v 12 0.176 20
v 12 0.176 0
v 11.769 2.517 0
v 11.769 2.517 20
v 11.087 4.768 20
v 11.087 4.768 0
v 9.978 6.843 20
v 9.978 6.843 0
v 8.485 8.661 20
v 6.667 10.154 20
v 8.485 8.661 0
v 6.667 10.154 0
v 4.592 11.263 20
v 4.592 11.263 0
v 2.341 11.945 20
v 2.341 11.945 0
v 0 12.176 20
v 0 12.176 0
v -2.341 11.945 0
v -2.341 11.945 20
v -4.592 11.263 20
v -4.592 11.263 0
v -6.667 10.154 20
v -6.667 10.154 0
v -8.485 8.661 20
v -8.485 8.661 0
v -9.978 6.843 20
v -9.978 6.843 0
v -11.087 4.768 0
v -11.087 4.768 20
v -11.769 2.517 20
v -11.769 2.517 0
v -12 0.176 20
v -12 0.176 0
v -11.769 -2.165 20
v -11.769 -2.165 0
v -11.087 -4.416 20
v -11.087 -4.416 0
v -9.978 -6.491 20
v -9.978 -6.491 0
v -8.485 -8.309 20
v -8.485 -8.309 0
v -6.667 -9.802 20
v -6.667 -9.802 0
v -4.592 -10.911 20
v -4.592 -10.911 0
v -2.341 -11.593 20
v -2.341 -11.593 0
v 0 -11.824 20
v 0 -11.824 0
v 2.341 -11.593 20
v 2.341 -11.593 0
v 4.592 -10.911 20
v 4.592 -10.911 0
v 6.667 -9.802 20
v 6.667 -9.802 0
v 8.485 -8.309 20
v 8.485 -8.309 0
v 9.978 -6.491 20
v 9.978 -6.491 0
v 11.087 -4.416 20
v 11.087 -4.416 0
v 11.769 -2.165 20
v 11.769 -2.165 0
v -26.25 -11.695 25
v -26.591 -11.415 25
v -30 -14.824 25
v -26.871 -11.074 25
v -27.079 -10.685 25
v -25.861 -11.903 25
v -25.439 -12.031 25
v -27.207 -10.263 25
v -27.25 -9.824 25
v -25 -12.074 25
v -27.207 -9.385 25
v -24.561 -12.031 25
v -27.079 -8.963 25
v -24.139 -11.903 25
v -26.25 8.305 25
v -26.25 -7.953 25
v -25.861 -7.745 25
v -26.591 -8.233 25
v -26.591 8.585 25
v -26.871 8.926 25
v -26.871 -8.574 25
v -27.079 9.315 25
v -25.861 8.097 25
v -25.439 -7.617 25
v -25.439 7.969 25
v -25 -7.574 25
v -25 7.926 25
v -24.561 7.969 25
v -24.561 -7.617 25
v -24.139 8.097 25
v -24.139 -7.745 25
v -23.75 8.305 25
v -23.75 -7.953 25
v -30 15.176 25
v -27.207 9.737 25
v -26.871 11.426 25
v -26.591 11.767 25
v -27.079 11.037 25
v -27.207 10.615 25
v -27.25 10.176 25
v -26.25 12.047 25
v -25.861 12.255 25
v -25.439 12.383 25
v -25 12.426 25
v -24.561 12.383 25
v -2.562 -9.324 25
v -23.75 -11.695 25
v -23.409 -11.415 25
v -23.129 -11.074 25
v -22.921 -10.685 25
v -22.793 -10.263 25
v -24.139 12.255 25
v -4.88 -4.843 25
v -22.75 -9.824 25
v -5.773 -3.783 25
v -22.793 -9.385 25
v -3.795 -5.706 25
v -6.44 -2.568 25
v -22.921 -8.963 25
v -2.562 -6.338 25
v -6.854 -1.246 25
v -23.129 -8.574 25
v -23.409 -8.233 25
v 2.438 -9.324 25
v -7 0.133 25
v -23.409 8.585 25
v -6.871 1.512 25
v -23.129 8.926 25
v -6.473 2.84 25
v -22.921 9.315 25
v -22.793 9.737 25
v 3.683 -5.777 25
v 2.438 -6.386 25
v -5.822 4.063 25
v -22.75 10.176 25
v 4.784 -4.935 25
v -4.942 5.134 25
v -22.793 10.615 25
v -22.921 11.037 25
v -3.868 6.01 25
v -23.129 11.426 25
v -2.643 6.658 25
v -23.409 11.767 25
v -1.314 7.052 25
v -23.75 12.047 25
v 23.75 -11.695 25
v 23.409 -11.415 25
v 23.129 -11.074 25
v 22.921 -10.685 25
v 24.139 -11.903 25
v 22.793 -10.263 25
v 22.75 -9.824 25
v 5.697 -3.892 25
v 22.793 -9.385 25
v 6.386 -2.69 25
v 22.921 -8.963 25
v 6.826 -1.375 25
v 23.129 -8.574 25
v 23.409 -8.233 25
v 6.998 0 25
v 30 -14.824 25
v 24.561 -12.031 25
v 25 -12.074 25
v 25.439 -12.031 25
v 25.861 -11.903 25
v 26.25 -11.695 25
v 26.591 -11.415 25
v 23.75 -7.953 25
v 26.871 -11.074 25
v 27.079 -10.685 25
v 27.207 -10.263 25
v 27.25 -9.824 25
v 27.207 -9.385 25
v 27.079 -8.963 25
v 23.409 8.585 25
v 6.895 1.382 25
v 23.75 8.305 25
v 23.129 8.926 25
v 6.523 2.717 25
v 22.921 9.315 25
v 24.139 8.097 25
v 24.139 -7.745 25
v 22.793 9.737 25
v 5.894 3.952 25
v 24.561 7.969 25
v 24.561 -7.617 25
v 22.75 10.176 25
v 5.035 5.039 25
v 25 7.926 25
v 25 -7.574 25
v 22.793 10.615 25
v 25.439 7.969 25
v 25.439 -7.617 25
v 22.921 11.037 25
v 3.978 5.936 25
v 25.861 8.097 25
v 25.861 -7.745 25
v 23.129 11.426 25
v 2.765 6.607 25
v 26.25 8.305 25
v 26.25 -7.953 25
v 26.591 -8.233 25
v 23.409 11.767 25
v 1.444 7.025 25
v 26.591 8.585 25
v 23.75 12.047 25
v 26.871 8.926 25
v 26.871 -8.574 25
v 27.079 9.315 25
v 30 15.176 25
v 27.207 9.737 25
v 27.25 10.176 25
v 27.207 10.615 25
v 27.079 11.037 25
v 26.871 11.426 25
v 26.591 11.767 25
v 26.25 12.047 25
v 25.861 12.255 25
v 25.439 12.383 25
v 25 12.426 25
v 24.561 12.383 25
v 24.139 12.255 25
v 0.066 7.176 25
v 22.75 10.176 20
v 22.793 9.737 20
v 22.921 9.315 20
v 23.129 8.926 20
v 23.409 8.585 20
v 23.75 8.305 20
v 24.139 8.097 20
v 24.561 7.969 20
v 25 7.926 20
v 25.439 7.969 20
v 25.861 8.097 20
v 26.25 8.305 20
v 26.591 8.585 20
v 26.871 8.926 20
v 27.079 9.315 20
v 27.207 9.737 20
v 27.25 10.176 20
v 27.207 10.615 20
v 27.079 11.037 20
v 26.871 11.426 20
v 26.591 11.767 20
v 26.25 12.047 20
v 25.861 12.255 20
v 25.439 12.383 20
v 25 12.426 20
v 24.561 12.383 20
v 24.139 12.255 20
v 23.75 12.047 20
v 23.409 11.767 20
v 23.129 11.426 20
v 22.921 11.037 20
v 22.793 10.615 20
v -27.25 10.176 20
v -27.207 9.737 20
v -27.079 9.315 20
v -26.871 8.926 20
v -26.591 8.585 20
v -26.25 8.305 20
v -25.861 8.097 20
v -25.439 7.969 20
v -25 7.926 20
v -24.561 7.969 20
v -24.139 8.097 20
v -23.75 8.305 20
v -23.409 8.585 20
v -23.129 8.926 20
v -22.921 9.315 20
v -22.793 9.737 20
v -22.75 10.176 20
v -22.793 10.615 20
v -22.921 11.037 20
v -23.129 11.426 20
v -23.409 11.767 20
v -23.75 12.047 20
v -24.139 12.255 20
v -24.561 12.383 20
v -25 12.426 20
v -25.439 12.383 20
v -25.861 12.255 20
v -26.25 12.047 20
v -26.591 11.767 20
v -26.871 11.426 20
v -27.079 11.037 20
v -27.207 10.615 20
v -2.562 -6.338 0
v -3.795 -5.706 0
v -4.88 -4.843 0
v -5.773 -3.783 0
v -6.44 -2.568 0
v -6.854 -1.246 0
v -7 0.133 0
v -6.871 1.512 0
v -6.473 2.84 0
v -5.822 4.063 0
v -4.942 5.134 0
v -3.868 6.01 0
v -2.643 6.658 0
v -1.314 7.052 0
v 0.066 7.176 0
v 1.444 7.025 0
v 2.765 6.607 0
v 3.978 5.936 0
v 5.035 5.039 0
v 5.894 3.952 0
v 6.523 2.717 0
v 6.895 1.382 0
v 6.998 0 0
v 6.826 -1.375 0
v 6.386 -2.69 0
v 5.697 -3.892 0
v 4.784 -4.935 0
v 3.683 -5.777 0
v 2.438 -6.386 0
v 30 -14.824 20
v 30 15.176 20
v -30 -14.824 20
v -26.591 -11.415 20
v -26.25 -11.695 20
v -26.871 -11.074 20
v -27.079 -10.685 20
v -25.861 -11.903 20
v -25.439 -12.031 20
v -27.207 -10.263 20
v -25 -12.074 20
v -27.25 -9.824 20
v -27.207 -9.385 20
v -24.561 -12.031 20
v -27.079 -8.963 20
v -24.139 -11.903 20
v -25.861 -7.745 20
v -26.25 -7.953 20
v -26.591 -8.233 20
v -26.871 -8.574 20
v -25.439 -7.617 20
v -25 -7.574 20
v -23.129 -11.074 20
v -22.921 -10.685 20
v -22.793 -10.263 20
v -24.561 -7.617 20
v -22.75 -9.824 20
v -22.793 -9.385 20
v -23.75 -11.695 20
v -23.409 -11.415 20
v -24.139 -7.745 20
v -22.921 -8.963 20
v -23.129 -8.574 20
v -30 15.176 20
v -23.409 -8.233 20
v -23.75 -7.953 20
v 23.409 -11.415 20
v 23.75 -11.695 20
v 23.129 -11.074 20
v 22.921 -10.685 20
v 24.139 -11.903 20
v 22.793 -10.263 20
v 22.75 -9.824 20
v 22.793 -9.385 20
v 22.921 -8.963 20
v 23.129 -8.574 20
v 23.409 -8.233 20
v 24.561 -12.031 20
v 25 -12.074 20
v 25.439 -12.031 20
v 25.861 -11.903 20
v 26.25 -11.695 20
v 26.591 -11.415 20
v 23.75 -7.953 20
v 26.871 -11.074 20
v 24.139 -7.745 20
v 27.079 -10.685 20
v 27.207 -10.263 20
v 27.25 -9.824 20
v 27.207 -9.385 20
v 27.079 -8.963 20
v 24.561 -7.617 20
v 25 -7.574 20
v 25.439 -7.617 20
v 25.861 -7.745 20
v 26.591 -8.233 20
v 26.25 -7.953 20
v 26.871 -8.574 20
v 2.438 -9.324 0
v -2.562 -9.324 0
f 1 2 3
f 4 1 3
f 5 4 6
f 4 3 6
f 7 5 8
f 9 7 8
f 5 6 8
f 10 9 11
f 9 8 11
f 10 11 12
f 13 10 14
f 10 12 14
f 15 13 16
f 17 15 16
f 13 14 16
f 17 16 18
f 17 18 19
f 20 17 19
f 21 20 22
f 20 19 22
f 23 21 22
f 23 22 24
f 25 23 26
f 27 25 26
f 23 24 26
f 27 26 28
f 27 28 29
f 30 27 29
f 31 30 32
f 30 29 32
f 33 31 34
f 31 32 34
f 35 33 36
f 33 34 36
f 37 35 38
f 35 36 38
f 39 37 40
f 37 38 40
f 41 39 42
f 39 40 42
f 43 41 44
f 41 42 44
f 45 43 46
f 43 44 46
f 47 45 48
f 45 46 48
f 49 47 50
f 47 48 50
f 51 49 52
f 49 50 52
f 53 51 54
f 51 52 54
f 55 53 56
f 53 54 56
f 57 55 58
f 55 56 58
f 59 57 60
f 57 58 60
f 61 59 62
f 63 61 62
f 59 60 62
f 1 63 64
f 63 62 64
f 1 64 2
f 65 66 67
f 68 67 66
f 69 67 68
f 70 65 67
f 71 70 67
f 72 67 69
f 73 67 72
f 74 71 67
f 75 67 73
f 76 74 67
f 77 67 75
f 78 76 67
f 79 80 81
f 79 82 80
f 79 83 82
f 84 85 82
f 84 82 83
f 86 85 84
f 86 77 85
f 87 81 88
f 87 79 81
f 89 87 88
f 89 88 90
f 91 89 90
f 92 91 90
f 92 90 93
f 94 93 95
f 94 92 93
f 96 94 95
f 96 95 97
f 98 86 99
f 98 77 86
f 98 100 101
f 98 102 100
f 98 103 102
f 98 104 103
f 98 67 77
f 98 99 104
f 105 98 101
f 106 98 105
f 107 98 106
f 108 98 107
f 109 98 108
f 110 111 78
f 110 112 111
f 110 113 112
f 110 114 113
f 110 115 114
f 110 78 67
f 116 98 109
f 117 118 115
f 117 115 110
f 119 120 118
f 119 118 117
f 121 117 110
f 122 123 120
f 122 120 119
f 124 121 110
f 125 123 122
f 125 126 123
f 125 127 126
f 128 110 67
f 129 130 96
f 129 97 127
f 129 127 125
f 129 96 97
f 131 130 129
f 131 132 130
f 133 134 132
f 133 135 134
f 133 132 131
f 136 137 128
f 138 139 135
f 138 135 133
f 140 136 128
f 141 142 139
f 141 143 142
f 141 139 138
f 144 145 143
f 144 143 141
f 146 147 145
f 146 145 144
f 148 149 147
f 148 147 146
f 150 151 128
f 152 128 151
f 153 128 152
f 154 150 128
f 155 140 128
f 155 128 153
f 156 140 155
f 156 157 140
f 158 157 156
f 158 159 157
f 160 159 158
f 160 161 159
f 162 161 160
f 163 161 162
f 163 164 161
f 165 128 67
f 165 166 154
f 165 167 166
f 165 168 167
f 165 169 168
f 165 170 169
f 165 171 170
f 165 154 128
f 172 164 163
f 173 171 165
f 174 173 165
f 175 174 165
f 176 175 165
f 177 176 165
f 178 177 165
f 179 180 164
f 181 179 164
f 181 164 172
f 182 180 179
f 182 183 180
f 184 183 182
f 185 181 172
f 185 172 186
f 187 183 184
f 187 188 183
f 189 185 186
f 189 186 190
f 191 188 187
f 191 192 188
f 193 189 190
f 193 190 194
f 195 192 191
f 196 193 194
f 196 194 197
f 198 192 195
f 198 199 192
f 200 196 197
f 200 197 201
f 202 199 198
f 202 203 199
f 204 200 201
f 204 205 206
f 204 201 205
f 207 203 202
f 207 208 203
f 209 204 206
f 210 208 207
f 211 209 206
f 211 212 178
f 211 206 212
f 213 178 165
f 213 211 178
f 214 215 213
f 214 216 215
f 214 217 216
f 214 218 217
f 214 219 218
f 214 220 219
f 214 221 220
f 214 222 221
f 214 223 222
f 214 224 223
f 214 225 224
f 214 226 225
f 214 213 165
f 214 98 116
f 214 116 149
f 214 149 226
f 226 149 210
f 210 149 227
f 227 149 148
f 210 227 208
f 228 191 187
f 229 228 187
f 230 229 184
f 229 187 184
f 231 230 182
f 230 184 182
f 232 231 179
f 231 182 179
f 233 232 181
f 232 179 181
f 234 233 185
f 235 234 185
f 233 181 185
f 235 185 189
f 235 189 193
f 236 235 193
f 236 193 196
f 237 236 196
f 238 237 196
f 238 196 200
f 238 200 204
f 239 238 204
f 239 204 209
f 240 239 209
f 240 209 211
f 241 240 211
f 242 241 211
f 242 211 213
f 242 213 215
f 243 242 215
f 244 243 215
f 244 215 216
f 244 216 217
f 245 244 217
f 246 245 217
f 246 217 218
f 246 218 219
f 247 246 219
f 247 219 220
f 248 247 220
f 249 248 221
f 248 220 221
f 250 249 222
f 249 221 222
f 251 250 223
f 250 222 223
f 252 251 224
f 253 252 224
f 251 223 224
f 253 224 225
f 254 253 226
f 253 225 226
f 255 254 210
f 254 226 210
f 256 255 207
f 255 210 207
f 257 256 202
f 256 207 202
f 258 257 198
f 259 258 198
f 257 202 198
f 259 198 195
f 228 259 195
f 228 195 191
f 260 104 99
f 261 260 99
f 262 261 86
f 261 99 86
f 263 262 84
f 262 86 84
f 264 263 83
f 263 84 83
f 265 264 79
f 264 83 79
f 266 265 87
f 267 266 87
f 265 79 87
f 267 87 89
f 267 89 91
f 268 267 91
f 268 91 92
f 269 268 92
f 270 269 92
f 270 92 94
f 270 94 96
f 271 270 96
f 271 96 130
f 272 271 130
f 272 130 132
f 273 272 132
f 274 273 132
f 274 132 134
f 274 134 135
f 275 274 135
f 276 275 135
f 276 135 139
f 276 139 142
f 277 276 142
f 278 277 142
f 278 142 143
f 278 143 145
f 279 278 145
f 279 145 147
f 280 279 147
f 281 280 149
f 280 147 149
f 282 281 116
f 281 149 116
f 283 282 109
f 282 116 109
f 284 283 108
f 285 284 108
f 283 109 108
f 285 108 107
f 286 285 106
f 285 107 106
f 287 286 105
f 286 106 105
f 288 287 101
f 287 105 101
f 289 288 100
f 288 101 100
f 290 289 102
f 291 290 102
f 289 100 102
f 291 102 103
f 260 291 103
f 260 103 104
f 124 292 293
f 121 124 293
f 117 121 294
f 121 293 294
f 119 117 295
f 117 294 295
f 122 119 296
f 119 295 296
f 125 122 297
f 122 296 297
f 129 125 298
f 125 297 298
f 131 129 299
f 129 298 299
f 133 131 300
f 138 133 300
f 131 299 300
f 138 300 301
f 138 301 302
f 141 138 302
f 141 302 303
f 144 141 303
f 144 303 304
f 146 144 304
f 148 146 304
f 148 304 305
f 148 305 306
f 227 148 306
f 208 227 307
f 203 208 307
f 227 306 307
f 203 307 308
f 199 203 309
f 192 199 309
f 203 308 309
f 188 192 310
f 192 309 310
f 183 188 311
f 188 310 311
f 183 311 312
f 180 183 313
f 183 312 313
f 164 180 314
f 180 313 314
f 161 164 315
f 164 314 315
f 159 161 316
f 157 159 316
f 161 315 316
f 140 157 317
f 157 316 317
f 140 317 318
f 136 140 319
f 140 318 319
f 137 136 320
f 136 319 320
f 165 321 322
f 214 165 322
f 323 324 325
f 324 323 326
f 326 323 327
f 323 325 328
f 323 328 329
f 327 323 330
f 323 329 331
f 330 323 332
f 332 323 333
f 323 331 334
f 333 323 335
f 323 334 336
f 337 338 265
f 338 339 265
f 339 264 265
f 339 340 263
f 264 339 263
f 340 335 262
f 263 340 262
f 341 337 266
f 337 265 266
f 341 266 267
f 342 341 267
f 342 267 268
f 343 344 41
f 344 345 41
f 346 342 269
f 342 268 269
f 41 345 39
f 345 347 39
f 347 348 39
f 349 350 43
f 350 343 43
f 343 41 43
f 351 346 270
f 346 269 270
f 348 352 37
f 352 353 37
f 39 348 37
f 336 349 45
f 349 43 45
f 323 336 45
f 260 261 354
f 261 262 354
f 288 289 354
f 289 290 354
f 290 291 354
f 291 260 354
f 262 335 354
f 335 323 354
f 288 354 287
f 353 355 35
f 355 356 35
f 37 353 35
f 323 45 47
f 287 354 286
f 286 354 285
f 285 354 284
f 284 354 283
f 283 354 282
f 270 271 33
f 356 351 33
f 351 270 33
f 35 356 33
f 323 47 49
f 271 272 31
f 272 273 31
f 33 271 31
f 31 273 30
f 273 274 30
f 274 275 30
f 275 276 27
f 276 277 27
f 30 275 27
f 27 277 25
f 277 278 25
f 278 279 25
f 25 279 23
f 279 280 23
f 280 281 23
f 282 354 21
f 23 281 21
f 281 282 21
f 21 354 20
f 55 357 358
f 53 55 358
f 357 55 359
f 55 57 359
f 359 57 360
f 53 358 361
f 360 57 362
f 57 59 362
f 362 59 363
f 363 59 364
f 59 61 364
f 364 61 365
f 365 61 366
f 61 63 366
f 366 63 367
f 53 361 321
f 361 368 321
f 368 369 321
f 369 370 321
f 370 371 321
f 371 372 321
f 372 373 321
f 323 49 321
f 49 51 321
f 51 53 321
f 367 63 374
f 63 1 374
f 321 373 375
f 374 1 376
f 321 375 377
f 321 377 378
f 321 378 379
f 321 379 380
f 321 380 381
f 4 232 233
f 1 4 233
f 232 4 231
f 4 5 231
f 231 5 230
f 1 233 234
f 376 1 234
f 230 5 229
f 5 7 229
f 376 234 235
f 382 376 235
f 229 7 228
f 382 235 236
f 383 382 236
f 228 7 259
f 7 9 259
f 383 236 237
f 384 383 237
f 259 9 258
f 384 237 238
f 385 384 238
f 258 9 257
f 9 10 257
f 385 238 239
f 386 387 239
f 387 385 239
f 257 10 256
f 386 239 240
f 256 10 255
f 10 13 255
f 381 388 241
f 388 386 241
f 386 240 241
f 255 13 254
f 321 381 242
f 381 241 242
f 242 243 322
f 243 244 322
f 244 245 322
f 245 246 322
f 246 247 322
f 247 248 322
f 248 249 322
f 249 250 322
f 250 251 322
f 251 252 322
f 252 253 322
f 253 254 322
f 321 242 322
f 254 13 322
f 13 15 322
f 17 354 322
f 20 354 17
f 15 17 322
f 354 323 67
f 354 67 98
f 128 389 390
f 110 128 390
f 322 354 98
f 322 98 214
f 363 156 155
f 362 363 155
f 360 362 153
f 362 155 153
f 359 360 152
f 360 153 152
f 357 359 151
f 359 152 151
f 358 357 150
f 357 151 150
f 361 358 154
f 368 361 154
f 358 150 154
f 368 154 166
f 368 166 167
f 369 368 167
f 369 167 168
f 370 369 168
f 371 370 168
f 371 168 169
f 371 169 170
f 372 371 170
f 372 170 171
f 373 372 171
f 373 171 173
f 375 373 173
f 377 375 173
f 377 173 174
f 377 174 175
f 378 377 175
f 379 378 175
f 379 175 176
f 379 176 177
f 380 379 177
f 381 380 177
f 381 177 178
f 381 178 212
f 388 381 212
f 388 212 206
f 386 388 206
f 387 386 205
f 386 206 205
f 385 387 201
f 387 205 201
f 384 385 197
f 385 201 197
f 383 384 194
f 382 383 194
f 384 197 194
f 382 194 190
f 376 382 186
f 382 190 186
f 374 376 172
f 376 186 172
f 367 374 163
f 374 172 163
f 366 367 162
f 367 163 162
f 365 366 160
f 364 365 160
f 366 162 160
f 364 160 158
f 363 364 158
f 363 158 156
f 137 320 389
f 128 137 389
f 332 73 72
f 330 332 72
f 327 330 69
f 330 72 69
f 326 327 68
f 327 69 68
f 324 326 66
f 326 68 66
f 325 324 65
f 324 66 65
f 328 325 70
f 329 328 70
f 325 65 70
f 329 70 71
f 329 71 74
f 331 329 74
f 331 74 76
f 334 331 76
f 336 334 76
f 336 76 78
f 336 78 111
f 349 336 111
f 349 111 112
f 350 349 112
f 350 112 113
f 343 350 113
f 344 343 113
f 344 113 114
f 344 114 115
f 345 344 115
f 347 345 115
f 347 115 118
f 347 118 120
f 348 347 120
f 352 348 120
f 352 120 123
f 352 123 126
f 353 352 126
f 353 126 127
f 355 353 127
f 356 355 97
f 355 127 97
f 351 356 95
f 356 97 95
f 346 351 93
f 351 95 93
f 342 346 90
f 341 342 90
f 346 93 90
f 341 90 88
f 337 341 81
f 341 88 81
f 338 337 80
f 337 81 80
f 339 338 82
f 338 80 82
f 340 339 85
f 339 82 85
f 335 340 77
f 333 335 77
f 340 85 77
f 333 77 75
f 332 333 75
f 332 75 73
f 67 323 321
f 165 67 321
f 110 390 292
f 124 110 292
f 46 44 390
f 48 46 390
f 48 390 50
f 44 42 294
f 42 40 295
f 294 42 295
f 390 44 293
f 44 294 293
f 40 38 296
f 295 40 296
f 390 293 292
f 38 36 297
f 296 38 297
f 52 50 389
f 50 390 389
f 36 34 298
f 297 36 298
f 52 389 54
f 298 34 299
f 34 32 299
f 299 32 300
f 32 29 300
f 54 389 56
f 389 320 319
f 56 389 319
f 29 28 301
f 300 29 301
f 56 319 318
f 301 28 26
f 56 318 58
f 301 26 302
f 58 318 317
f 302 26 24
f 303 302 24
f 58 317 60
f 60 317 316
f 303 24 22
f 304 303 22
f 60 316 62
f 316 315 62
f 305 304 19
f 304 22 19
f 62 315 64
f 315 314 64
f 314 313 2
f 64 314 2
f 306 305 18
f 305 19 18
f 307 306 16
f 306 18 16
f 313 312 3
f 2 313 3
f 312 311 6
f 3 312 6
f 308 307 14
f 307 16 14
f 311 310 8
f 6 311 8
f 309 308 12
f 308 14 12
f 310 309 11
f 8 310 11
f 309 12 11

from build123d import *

# Parameters (mm, degrees)
F0_W     = 60
F0_H     = 30
F0_R     = 2
F0_R_2   = 12
F1_DEPTH = 25
F2_D     = 4.5
F3_DEPTH = 20


with BuildPart() as f1:
    # F0 (on Top) → F1 (new body)
    with BuildSketch(Plane.XY):
        with Locations((0, 0.1760203019)):
            Rectangle(F0_W, F0_H)
        with Locations((-25, -9.8239796981)):
            Circle(F0_R, mode=Mode.SUBTRACT)
        with Locations((25, -9.8239796981)):
            Circle(F0_R, mode=Mode.SUBTRACT)
        with Locations((0, 0.1760203019)):
            Circle(F0_R_2, mode=Mode.SUBTRACT)
        with Locations((-25, 10.1760203019)):
            Circle(F0_R, mode=Mode.SUBTRACT)
        with Locations((25, 10.1760203019)):
            Circle(F0_R, mode=Mode.SUBTRACT)
        with Locations((0, 0.1760203019)):
            Circle(F0_R_2)
        with BuildLine():
            ThreePointArc((-2.5620431112, -6.3382666964), (0.0664242114, 7.1757051394), (2.4379568888, -6.385714698))
            Line((2.4379568888, -6.385714698), (2.4379568888, -9.3239796981))
            Line((2.4379568888, -9.3239796981), (-2.5620431112, -9.3239796981))
            Line((-2.5620431112, -9.3239796981), (-2.5620431112, -6.3382666964))
        make_face(mode=Mode.SUBTRACT)
    extrude(amount=F1_DEPTH)

    # F2 (through all)
    with Locations(Plane(origin=(0, 0, 0), x_dir=(1, 0, 0), z_dir=(0, 0, -1))):
        with Locations((-25, 9.8239796981), (-25, -10.1760203019), (25, -10.1760203019), (25, 9.8239796981)):
            Hole(F2_D / 2)

    # F0 (on Top) → F3 (cut)
    with BuildSketch(Plane.XY):
        with Locations((0, 0.1760203019)):
            Rectangle(F0_W, F0_H)
        with Locations((-25, -9.8239796981)):
            Circle(F0_R, mode=Mode.SUBTRACT)
        with Locations((25, -9.8239796981)):
            Circle(F0_R, mode=Mode.SUBTRACT)
        with Locations((0, 0.1760203019)):
            Circle(F0_R_2, mode=Mode.SUBTRACT)
        with Locations((-25, 10.1760203019)):
            Circle(F0_R, mode=Mode.SUBTRACT)
        with Locations((25, 10.1760203019)):
            Circle(F0_R, mode=Mode.SUBTRACT)
    extrude(amount=F3_DEPTH, mode=Mode.SUBTRACT)


solid = f1.part
